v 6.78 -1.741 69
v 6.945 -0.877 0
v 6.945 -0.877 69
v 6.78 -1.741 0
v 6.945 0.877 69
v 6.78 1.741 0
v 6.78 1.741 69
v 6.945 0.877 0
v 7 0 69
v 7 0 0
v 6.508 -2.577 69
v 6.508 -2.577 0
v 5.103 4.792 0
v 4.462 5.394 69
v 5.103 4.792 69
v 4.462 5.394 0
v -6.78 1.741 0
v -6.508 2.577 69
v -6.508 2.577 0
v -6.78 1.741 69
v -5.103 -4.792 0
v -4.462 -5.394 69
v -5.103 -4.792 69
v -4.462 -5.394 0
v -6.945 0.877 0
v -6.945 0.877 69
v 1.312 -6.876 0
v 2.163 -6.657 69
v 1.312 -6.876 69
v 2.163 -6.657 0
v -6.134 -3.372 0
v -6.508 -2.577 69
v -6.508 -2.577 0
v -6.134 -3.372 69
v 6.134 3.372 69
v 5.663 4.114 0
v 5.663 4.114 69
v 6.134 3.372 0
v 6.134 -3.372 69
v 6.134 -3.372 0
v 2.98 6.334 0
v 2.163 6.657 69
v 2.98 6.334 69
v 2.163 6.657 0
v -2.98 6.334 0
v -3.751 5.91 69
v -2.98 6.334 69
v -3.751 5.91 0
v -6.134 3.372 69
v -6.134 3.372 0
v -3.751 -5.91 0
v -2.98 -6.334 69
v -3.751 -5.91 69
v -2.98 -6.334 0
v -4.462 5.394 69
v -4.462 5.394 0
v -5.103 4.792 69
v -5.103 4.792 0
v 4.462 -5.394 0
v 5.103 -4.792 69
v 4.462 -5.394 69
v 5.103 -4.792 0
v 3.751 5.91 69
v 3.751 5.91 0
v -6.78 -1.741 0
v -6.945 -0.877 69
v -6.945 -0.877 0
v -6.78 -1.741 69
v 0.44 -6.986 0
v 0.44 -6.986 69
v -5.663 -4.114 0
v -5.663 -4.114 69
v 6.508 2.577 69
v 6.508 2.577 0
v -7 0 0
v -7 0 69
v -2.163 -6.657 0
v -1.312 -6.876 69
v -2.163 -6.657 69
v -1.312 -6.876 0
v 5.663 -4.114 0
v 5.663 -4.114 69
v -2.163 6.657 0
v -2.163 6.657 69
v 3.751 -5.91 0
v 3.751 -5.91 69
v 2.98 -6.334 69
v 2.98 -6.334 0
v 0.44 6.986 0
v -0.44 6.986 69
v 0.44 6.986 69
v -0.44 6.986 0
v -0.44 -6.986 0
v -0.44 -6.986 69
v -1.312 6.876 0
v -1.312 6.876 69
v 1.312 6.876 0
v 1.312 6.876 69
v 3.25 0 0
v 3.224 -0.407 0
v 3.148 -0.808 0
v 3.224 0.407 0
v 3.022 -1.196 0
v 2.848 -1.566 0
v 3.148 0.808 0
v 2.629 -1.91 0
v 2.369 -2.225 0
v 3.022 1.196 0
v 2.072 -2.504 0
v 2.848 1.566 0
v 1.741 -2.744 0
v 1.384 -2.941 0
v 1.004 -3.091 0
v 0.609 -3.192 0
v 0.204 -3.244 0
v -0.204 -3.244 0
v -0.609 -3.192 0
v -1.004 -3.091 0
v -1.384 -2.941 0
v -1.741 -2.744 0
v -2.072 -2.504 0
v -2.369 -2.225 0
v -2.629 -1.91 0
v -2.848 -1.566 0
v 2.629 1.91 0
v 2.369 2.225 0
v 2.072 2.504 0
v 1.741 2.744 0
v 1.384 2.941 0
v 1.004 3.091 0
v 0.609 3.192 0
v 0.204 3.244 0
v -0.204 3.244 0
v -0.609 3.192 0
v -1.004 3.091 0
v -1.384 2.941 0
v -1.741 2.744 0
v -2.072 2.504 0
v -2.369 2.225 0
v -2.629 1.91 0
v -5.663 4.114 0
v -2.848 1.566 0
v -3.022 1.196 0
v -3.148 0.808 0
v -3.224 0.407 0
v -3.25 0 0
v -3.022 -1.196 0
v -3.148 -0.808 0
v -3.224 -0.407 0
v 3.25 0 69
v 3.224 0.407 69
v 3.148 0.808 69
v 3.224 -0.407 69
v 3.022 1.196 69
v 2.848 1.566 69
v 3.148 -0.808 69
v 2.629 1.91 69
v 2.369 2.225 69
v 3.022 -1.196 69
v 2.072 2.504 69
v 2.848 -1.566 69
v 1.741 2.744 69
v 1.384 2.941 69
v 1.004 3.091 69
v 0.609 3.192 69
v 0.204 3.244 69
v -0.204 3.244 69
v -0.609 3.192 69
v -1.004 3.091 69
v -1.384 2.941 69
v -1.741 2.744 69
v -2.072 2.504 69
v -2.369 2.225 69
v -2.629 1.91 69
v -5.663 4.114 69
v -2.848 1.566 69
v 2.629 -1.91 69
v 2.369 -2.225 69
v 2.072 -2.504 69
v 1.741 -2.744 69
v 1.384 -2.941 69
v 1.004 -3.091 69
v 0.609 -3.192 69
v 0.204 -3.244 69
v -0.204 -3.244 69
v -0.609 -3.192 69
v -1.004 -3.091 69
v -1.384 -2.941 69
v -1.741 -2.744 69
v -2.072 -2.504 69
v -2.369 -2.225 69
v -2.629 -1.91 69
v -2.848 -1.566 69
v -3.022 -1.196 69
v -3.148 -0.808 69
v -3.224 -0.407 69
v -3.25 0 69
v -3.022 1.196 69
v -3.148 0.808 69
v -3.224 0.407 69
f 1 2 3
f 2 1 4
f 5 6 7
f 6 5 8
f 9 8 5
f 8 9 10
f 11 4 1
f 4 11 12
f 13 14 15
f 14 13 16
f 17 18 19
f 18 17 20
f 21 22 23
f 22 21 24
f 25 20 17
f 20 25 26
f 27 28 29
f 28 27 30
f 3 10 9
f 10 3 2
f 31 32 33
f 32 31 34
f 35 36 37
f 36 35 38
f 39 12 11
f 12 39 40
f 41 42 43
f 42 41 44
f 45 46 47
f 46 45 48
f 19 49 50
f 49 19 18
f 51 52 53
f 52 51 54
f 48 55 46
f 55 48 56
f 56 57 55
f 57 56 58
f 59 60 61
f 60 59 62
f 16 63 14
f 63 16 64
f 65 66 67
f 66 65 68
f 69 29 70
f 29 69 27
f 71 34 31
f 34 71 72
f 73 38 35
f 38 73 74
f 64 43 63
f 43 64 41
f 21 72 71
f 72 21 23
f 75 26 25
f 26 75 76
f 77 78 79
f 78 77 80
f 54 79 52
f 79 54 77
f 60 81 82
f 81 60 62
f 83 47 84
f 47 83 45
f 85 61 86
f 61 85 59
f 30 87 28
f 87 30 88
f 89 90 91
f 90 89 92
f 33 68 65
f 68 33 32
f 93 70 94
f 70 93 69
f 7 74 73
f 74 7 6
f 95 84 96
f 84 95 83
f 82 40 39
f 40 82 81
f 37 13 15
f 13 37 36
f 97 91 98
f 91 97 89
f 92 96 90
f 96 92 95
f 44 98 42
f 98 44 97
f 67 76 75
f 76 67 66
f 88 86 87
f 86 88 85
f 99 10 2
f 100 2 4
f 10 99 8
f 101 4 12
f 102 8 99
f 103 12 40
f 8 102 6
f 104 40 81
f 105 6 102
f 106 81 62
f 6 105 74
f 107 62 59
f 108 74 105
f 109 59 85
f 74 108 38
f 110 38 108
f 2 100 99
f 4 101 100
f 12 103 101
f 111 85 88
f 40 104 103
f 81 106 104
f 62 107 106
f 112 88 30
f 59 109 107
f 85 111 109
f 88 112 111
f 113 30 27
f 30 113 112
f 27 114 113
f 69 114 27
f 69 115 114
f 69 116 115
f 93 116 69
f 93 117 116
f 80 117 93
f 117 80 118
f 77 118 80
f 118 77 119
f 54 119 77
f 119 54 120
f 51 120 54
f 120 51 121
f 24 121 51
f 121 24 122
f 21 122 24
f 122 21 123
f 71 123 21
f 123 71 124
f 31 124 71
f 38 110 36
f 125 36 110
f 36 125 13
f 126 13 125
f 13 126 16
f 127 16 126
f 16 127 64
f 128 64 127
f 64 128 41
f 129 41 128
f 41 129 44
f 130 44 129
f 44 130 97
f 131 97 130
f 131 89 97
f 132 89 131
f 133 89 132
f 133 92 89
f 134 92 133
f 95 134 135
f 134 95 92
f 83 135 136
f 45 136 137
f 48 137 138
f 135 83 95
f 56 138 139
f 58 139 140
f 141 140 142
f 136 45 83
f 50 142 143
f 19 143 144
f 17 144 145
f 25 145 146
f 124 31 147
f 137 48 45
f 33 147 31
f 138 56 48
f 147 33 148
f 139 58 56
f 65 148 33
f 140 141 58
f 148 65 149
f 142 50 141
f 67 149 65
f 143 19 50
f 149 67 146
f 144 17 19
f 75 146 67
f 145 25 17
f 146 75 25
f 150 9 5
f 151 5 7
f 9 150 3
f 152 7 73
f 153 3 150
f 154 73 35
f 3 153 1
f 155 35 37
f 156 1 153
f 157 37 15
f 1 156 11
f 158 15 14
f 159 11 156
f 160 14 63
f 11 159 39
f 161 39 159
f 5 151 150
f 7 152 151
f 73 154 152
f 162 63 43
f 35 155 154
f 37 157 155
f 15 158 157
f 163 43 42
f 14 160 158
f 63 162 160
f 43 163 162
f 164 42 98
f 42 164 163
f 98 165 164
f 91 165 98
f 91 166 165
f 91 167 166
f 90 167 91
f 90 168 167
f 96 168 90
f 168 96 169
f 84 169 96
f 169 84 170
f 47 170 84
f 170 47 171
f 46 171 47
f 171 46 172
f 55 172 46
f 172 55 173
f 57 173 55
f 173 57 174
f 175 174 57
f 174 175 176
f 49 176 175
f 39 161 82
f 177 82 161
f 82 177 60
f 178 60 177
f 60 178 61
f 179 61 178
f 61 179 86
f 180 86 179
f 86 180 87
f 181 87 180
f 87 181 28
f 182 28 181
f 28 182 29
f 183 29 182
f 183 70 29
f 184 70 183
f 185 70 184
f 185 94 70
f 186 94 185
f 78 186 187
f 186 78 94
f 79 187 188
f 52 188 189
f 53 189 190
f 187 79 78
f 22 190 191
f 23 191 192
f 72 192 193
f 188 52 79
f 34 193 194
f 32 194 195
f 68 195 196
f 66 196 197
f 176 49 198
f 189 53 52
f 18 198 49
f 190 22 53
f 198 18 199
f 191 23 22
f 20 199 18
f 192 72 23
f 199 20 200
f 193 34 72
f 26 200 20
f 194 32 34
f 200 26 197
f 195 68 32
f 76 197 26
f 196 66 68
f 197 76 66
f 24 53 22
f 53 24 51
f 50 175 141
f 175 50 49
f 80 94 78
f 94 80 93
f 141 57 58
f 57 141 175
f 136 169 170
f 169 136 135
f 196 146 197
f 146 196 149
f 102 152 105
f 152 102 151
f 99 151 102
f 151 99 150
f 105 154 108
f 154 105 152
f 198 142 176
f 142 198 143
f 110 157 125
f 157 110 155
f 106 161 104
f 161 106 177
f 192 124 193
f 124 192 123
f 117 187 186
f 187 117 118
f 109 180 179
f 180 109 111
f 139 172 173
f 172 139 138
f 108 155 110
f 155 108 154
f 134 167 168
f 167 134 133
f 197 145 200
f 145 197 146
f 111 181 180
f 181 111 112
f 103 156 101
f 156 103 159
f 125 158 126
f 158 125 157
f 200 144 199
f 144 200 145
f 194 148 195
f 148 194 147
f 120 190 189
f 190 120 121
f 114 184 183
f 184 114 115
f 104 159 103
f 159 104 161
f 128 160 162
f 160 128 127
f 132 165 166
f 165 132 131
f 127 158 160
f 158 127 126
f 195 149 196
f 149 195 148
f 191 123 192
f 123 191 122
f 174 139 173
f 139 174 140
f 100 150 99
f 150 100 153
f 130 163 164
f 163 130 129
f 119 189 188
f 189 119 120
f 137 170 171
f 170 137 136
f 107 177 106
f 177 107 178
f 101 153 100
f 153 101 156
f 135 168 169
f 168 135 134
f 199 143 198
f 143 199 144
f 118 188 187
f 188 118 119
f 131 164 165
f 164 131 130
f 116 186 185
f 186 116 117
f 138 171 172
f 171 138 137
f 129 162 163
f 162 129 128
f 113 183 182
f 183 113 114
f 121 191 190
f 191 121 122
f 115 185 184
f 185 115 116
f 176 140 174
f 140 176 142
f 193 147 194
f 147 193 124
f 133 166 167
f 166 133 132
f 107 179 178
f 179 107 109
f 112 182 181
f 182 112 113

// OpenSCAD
$fn = 50;


difference() {
	union() {
		cylinder(h = 69, r = 7.0000000000);
	}
	union() {
		translate(v = [0, 0, -100]) {
			cylinder(h = 200, r = 3.2500000000);
		}
	}
}
